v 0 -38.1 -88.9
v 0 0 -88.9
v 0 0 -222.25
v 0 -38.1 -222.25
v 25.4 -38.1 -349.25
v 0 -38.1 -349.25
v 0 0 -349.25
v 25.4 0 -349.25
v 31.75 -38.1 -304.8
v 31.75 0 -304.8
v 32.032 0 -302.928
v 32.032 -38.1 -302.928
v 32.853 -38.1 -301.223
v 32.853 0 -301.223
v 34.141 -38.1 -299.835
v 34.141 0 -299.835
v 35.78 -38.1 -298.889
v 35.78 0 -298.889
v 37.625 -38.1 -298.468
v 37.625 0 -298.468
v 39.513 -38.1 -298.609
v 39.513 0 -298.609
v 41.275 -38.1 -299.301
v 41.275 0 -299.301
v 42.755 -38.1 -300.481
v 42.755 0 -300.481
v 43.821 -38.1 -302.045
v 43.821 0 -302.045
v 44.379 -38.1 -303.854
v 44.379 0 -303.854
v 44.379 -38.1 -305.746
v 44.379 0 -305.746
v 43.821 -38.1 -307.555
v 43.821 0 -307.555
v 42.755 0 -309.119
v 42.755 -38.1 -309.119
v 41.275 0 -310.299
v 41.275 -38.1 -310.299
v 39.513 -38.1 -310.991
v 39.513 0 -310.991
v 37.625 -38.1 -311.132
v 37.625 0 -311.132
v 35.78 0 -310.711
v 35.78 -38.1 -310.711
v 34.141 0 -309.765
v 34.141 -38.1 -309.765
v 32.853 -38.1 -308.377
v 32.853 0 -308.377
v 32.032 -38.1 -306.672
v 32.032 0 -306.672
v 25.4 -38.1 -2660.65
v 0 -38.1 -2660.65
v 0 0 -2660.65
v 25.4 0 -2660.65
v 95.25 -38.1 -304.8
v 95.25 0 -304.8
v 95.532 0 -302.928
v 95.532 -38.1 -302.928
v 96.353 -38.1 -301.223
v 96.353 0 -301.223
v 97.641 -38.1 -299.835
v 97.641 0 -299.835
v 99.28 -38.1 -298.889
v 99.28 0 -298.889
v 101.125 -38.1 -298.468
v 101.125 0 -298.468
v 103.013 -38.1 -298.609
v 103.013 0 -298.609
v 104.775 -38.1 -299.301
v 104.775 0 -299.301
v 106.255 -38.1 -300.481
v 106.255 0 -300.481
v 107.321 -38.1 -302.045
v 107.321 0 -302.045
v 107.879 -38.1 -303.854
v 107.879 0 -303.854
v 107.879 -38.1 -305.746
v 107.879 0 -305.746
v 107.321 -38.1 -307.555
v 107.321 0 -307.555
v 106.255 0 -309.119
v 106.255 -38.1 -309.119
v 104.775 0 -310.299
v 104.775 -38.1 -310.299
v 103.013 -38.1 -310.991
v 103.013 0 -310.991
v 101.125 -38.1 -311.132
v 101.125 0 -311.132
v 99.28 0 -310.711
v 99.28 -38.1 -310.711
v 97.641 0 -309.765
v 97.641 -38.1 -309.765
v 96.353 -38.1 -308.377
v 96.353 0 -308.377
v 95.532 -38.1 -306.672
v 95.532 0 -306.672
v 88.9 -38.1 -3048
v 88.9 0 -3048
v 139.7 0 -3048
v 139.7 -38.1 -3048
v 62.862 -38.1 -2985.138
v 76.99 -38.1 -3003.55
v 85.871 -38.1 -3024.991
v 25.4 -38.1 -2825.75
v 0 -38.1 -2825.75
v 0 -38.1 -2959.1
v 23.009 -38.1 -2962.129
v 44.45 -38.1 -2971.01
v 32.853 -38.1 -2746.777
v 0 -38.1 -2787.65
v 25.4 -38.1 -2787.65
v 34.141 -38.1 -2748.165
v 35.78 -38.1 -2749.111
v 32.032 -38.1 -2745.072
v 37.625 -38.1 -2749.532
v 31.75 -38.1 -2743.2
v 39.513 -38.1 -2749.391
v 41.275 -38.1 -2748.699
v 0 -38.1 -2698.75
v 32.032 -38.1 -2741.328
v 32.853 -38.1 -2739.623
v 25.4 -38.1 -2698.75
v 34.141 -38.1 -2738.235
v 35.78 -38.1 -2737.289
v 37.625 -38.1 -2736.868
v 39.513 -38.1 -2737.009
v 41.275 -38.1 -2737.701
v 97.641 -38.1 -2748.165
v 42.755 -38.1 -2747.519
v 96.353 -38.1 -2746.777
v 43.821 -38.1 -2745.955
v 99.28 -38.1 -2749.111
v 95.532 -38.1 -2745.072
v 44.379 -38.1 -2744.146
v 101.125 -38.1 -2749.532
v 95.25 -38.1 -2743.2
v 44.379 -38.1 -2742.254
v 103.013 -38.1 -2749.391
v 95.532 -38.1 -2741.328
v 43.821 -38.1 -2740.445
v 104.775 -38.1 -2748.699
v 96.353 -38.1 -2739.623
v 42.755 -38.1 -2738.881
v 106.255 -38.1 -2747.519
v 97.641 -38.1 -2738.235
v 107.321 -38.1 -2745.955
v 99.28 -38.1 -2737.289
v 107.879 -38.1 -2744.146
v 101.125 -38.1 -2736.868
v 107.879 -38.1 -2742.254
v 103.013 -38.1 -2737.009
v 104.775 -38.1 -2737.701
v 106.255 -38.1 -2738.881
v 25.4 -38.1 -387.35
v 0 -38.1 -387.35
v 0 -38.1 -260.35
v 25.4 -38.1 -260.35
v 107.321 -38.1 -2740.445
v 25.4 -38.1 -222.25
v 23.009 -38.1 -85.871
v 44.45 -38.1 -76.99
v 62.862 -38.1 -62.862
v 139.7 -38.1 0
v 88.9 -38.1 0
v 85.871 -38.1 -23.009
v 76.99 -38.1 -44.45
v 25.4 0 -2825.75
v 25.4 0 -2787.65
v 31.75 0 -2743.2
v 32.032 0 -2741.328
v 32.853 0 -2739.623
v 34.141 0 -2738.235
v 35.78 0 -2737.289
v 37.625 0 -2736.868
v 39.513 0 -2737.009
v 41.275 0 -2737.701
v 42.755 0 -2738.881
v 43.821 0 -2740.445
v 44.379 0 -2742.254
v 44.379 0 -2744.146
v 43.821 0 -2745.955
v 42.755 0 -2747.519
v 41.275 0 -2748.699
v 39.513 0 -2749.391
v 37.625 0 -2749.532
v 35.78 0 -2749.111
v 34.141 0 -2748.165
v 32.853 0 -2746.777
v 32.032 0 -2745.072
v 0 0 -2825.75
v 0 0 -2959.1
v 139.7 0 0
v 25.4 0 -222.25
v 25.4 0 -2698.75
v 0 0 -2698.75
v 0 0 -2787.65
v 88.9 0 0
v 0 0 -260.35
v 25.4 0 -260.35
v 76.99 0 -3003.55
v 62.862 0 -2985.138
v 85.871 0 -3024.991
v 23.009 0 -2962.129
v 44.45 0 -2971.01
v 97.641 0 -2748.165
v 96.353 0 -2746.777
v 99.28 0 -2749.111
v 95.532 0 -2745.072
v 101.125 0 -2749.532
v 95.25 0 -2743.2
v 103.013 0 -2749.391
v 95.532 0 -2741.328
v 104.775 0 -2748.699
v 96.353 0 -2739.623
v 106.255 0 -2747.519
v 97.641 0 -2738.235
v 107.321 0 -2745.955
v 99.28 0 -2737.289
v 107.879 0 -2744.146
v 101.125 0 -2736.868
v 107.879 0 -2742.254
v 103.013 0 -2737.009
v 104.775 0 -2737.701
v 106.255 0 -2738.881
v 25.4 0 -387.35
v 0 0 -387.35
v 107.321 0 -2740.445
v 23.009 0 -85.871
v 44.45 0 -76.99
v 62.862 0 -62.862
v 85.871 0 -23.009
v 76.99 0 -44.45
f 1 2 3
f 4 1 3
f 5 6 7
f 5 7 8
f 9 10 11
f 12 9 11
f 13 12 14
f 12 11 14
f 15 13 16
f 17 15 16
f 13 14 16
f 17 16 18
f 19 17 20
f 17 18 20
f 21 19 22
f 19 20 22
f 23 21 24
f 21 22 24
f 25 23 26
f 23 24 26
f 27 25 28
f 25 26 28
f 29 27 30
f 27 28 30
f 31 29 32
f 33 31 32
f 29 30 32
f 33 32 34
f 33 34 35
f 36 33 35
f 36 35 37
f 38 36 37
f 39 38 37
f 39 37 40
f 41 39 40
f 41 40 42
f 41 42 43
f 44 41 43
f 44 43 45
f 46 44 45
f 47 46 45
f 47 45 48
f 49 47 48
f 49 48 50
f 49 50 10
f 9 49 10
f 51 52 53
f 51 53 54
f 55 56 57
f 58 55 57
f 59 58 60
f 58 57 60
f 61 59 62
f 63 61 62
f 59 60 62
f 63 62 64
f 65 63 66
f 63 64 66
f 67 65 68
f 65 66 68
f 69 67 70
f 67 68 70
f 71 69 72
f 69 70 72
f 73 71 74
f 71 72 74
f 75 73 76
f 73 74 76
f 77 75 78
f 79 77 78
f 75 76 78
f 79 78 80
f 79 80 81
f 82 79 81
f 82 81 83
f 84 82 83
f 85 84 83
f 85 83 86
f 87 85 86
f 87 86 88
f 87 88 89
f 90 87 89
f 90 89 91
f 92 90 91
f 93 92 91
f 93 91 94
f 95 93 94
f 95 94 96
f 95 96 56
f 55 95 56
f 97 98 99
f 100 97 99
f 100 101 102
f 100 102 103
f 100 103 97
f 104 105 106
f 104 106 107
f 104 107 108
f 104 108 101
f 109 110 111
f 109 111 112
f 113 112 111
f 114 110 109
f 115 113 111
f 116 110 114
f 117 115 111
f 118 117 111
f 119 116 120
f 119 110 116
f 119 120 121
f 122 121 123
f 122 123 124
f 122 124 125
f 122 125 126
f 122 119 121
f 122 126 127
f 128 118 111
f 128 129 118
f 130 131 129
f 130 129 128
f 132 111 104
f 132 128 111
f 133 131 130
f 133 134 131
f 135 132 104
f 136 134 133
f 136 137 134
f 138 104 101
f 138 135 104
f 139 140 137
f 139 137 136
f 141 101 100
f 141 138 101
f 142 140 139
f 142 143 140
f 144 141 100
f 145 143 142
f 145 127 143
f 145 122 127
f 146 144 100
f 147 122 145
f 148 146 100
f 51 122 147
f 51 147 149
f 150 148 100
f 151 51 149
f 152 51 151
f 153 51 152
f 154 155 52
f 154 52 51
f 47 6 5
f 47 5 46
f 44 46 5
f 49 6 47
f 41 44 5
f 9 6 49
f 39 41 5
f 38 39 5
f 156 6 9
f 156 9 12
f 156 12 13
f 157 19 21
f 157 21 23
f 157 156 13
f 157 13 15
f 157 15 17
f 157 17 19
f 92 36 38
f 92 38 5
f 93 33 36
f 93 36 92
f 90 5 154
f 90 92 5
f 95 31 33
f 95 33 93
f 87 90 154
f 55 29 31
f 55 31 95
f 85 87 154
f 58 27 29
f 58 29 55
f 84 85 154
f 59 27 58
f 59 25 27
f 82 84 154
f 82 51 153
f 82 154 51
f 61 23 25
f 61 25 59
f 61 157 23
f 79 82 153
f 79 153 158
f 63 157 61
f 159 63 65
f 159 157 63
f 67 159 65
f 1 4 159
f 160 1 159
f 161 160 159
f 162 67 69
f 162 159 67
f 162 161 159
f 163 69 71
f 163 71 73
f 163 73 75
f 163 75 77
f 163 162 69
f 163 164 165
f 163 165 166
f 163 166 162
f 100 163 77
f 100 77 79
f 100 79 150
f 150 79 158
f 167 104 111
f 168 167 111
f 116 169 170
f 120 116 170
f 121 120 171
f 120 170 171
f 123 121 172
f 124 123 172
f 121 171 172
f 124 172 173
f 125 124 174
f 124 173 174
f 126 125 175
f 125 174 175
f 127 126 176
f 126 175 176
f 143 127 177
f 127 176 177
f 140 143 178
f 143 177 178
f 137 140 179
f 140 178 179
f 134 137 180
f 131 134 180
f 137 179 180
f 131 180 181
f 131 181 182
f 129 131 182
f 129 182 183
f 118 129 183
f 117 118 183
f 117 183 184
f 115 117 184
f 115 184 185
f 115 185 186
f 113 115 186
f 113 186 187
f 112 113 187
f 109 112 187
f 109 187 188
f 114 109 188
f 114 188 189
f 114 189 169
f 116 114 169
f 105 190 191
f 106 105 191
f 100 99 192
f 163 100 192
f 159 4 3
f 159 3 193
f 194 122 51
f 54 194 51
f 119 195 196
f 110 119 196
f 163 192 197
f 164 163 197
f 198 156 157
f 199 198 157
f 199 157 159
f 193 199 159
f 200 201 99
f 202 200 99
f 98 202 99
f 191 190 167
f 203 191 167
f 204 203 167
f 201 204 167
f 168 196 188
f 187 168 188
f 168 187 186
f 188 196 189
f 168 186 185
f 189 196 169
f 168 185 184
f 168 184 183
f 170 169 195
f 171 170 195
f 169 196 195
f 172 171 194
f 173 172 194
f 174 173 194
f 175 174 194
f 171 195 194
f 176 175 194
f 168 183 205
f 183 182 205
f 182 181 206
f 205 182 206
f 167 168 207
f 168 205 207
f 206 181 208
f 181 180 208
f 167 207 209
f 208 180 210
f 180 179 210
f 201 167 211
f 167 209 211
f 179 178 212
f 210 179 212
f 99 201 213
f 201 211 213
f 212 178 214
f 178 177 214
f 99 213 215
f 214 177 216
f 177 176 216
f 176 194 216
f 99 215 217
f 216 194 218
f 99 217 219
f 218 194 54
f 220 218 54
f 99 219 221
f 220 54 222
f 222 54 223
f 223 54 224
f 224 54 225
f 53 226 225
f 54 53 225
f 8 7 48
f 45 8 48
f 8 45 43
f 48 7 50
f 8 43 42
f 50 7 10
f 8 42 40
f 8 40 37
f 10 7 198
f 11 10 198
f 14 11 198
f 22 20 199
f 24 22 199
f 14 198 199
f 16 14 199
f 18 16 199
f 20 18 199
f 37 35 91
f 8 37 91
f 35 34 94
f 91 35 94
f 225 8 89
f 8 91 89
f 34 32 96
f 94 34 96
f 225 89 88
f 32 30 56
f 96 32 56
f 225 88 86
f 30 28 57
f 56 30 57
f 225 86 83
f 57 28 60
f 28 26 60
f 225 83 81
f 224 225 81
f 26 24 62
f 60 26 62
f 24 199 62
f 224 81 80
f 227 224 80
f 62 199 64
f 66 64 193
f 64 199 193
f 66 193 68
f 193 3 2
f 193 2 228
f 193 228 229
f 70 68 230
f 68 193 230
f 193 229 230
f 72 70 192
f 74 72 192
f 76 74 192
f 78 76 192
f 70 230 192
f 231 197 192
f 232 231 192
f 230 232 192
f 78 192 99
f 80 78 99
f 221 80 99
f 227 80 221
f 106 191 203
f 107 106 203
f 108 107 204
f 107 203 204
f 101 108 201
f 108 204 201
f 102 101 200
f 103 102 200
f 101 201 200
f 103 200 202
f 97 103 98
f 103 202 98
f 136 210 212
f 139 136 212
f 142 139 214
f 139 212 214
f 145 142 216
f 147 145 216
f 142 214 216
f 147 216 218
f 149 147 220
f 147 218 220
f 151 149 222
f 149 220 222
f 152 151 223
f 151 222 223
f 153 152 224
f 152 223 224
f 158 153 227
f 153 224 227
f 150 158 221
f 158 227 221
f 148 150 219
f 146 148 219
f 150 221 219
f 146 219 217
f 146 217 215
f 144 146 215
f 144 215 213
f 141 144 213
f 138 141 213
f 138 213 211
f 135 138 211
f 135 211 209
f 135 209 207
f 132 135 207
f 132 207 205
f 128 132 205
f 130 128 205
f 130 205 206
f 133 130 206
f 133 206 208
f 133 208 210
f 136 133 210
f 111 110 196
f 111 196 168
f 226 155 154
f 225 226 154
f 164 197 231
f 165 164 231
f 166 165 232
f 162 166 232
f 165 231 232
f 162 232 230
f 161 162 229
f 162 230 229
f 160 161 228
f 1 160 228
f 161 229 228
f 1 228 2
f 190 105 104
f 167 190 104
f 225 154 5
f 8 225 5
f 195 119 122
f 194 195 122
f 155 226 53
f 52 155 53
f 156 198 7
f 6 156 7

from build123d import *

# Parameters (mm, degrees)
F1_DEPTH = 38.1
F3_D     = 12.7
F4_W     = 25.4
F4_H     = 38.1
F5_DEPTH = 38.101


# Not quite as in the source:
# - a length typed as a fraction of an inch, garbled in the dataset ("3 / 203.2 mm" for 3/8 in), is restored


with BuildPart() as f1:
    # F0 (on Front) → F1 (new body)
    with BuildSketch(Plane.XZ):
        with BuildLine():
            ThreePointArc((88.9, 0), (62.8617928475, -62.8617928475), (0, -88.9))
            Line((0, -88.9), (0, -2959.1))
            ThreePointArc((0, -2959.1), (62.8617928475, -2985.1382071525), (88.9, -3048))
            Line((88.9, -3048), (139.7, -3048))
            Line((139.7, -3048), (139.7, 0))
            Line((139.7, 0), (88.9, 0))
        make_face()
    extrude(amount=F1_DEPTH)

    # F3 (through all)
    with Locations(Plane.XZ.offset(38.1)):
        with Locations((38.1, -2743.2), (101.6, -2743.2), (38.1, -304.8), (101.6, -304.8)):
            Hole(F3_D / 2)

    # F4 (on face) → F5 (cut, through all)
    with BuildSketch(Plane.XZ.offset(38.1)):
        with Locations((12.7, -241.3)):
            Rectangle(F4_W, F4_H)
        with Locations((12.7, -368.3)):
            Rectangle(F4_W, F4_H)
        with Locations((12.7, -2679.7)):
            Rectangle(F4_W, F4_H)
        with Locations((12.7, -2806.7)):
            Rectangle(F4_W, F4_H)
    extrude(amount=-F5_DEPTH, mode=Mode.SUBTRACT)


solid = f1.part
